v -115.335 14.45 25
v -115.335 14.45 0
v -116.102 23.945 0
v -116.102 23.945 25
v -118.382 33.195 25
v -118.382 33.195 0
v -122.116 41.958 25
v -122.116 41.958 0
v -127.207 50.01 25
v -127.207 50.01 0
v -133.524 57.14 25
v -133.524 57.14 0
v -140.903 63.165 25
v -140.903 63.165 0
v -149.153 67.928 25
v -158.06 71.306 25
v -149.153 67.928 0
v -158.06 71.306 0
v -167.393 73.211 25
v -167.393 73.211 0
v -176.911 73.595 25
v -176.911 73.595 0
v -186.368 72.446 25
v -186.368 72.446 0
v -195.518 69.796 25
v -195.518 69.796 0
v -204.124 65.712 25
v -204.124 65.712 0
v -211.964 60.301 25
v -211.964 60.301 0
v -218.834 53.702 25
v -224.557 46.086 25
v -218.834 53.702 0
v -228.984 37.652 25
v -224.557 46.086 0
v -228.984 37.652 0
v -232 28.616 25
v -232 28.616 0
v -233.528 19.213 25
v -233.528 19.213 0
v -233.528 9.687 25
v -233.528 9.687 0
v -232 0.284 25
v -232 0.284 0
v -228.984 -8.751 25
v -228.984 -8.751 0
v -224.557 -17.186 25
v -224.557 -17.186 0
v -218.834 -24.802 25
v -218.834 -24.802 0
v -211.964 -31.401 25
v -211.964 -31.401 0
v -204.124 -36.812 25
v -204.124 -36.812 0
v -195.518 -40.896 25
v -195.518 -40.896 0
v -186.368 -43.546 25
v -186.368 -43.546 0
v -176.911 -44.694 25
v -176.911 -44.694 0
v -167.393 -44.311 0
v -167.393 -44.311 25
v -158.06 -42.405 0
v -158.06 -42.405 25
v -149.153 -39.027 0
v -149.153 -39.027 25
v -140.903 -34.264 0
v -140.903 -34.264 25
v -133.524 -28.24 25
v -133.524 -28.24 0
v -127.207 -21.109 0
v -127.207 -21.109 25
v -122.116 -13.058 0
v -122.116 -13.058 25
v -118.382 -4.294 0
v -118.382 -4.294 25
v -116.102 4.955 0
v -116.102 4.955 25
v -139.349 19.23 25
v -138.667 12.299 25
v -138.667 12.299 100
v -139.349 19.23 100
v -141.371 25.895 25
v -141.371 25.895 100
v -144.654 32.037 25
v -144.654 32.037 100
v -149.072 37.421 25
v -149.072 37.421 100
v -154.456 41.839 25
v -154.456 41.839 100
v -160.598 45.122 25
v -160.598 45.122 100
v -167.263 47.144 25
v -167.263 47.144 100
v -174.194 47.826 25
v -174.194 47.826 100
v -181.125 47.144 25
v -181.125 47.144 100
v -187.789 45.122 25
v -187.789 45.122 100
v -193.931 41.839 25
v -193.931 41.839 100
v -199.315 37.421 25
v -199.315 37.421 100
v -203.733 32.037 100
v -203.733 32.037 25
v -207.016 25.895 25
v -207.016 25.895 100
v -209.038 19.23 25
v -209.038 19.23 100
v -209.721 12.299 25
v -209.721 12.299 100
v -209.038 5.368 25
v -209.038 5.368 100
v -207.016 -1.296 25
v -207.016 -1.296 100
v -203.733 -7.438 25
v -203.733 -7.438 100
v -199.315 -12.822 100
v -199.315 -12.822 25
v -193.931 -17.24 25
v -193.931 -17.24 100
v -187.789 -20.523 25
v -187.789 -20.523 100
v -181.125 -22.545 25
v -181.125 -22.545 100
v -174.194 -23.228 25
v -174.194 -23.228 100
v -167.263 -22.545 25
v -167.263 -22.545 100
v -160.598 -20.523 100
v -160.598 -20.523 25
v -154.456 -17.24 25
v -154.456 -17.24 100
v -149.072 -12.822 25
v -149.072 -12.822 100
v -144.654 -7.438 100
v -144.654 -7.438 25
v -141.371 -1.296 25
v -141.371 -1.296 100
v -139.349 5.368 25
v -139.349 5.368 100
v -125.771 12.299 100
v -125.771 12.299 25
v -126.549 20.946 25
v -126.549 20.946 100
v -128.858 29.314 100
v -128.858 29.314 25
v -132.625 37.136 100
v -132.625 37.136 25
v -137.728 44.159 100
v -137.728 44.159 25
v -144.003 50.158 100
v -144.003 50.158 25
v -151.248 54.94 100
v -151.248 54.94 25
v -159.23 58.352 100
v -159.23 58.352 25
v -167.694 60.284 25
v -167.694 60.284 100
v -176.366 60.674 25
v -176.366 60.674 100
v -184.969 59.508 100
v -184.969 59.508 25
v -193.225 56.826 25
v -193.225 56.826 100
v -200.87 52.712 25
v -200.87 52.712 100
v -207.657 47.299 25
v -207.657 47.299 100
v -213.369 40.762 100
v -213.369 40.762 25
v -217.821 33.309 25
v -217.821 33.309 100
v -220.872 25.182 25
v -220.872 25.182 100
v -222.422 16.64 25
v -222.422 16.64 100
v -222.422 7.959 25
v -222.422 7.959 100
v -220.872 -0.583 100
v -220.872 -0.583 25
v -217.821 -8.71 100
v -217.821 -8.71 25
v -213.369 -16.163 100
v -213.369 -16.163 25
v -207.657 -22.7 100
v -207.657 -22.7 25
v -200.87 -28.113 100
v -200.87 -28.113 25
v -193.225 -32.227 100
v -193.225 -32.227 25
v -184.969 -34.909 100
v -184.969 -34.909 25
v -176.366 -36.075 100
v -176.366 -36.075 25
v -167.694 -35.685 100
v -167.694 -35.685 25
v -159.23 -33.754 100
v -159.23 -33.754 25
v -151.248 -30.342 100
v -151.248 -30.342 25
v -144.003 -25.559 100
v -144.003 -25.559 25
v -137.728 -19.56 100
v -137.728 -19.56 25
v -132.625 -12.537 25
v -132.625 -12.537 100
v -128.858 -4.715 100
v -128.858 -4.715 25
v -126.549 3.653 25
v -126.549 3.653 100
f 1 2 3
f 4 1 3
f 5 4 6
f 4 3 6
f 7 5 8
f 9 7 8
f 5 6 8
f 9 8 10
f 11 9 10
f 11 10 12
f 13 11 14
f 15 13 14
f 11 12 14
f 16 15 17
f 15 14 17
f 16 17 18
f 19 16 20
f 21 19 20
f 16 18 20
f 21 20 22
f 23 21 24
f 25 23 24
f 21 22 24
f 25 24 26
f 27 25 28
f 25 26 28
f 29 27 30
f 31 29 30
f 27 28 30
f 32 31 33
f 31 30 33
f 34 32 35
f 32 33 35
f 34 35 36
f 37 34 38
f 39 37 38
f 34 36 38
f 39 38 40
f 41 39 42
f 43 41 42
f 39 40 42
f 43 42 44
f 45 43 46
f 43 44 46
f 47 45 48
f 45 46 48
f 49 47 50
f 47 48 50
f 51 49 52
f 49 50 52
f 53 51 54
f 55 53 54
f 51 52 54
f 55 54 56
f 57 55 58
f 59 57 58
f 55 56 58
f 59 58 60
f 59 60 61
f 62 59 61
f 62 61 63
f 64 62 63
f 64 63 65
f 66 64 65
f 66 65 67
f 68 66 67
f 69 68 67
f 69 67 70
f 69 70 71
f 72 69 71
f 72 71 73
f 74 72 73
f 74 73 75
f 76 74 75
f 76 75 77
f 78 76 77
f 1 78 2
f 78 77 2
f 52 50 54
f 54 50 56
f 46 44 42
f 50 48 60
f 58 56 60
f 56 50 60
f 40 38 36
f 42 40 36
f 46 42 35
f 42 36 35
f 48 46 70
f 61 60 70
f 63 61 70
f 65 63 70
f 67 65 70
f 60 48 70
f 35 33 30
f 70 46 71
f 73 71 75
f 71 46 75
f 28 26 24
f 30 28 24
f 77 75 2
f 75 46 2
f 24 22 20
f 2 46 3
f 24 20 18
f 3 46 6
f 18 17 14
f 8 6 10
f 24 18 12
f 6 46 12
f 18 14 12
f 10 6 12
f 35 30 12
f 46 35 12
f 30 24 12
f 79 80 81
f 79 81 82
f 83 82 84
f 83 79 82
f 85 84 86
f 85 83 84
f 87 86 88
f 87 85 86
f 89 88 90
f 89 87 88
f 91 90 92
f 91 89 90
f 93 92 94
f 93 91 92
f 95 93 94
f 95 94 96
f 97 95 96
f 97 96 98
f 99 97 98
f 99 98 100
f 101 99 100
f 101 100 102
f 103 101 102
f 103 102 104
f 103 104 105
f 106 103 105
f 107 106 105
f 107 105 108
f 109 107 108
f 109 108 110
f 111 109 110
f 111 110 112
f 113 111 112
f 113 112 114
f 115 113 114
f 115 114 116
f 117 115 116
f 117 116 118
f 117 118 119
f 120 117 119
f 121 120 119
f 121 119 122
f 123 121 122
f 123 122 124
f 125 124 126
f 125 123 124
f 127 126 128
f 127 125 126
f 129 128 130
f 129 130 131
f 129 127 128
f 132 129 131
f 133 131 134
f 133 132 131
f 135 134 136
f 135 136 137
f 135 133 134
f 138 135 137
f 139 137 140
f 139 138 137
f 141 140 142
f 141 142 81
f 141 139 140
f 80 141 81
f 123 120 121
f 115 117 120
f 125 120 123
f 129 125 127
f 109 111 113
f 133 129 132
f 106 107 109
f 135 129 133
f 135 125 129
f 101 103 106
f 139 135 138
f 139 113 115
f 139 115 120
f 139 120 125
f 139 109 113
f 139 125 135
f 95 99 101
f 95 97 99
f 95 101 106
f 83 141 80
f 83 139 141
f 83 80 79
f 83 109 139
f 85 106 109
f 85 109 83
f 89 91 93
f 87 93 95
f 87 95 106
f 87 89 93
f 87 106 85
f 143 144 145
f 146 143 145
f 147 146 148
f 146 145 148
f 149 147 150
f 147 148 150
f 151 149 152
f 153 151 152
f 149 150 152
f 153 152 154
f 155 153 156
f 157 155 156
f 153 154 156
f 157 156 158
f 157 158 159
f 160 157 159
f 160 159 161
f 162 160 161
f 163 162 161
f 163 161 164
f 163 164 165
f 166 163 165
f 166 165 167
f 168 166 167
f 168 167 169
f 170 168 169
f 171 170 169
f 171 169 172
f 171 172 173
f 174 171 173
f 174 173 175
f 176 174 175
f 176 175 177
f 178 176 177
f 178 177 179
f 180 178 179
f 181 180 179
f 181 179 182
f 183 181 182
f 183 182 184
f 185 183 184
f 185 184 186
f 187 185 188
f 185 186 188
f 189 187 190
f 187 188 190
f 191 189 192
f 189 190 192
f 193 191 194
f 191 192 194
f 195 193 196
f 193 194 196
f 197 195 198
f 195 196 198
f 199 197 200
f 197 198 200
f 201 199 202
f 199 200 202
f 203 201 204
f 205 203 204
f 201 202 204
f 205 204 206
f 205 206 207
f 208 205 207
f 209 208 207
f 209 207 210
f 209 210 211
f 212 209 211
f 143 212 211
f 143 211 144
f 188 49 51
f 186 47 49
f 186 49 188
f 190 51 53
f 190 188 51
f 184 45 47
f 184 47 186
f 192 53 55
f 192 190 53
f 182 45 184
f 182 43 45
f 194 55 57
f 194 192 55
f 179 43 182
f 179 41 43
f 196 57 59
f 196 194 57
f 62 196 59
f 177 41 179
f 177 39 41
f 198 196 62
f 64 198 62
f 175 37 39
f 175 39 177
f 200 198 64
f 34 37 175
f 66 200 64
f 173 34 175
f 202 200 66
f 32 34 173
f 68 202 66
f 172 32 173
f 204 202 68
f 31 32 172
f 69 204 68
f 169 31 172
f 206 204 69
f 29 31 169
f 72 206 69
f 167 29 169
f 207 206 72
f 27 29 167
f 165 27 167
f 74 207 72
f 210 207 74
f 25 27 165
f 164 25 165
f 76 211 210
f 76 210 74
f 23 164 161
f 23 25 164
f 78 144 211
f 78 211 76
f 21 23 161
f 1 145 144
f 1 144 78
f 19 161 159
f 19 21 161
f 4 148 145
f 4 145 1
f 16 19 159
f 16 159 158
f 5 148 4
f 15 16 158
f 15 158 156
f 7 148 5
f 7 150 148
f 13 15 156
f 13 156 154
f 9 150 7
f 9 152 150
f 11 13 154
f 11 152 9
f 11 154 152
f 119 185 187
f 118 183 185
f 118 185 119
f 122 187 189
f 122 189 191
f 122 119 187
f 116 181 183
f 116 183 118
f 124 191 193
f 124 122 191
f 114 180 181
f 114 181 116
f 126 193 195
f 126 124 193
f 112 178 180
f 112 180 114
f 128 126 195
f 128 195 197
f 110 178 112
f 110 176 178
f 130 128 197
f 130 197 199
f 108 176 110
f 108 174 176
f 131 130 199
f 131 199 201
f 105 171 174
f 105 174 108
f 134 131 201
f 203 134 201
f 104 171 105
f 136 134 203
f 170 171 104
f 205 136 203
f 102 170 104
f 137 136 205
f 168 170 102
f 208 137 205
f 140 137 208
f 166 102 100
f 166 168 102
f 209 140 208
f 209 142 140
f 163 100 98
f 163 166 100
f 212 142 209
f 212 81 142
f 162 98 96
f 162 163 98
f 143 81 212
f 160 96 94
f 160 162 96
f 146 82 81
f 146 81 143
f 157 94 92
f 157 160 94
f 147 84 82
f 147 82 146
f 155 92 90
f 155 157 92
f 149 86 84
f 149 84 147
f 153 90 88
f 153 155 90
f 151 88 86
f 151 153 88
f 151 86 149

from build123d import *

# Parameters (mm, degrees)
F0_R     = 83.5800069383
F0_R_2   = 61.6002639071
F1_DEPTH = 381
F2_DEPTH = 127
F4_R     = 48.4229343949
F4_R_2   = 35.527059512
F5_DEPTH = 100
F6_R     = 59.1924644961
F7_DEPTH = 25


with BuildPart() as f1:
    # F0 (on Top) → F1 (new body)
    with BuildSketch(Plane.XY):
        with Locations((-408.8018536568, 0)):
            Circle(F0_R)
        with Locations((-408.8018536568, 0)):
            Circle(F0_R_2, mode=Mode.SUBTRACT)
    extrude(amount=F1_DEPTH)

    # F2 (add): a face of the model
    f2_faces = [f1.faces().sort_by_distance(p)[0] for p in [
        (-490.0178610079, 0, 381),
    ]]
    extrude(f2_faces, amount=F2_DEPTH)


with BuildPart() as f5:
    # F4 (on Top) → F5 (new body)
    with BuildSketch(Plane.XY):
        with Locations((-174.1937100887, 12.2994268313)):
            Circle(F4_R)
        with Locations((-174.1937100887, 12.2994268313)):
            Circle(F4_R_2, mode=Mode.SUBTRACT)
    extrude(amount=F5_DEPTH)

    # F6 (on Top) → F7 (join)
    with BuildSketch(Plane.XY):
        with Locations((-174.5279580355, 14.4501468167)):
            Circle(F6_R)
    extrude(amount=F7_DEPTH)


solid = f5.part
